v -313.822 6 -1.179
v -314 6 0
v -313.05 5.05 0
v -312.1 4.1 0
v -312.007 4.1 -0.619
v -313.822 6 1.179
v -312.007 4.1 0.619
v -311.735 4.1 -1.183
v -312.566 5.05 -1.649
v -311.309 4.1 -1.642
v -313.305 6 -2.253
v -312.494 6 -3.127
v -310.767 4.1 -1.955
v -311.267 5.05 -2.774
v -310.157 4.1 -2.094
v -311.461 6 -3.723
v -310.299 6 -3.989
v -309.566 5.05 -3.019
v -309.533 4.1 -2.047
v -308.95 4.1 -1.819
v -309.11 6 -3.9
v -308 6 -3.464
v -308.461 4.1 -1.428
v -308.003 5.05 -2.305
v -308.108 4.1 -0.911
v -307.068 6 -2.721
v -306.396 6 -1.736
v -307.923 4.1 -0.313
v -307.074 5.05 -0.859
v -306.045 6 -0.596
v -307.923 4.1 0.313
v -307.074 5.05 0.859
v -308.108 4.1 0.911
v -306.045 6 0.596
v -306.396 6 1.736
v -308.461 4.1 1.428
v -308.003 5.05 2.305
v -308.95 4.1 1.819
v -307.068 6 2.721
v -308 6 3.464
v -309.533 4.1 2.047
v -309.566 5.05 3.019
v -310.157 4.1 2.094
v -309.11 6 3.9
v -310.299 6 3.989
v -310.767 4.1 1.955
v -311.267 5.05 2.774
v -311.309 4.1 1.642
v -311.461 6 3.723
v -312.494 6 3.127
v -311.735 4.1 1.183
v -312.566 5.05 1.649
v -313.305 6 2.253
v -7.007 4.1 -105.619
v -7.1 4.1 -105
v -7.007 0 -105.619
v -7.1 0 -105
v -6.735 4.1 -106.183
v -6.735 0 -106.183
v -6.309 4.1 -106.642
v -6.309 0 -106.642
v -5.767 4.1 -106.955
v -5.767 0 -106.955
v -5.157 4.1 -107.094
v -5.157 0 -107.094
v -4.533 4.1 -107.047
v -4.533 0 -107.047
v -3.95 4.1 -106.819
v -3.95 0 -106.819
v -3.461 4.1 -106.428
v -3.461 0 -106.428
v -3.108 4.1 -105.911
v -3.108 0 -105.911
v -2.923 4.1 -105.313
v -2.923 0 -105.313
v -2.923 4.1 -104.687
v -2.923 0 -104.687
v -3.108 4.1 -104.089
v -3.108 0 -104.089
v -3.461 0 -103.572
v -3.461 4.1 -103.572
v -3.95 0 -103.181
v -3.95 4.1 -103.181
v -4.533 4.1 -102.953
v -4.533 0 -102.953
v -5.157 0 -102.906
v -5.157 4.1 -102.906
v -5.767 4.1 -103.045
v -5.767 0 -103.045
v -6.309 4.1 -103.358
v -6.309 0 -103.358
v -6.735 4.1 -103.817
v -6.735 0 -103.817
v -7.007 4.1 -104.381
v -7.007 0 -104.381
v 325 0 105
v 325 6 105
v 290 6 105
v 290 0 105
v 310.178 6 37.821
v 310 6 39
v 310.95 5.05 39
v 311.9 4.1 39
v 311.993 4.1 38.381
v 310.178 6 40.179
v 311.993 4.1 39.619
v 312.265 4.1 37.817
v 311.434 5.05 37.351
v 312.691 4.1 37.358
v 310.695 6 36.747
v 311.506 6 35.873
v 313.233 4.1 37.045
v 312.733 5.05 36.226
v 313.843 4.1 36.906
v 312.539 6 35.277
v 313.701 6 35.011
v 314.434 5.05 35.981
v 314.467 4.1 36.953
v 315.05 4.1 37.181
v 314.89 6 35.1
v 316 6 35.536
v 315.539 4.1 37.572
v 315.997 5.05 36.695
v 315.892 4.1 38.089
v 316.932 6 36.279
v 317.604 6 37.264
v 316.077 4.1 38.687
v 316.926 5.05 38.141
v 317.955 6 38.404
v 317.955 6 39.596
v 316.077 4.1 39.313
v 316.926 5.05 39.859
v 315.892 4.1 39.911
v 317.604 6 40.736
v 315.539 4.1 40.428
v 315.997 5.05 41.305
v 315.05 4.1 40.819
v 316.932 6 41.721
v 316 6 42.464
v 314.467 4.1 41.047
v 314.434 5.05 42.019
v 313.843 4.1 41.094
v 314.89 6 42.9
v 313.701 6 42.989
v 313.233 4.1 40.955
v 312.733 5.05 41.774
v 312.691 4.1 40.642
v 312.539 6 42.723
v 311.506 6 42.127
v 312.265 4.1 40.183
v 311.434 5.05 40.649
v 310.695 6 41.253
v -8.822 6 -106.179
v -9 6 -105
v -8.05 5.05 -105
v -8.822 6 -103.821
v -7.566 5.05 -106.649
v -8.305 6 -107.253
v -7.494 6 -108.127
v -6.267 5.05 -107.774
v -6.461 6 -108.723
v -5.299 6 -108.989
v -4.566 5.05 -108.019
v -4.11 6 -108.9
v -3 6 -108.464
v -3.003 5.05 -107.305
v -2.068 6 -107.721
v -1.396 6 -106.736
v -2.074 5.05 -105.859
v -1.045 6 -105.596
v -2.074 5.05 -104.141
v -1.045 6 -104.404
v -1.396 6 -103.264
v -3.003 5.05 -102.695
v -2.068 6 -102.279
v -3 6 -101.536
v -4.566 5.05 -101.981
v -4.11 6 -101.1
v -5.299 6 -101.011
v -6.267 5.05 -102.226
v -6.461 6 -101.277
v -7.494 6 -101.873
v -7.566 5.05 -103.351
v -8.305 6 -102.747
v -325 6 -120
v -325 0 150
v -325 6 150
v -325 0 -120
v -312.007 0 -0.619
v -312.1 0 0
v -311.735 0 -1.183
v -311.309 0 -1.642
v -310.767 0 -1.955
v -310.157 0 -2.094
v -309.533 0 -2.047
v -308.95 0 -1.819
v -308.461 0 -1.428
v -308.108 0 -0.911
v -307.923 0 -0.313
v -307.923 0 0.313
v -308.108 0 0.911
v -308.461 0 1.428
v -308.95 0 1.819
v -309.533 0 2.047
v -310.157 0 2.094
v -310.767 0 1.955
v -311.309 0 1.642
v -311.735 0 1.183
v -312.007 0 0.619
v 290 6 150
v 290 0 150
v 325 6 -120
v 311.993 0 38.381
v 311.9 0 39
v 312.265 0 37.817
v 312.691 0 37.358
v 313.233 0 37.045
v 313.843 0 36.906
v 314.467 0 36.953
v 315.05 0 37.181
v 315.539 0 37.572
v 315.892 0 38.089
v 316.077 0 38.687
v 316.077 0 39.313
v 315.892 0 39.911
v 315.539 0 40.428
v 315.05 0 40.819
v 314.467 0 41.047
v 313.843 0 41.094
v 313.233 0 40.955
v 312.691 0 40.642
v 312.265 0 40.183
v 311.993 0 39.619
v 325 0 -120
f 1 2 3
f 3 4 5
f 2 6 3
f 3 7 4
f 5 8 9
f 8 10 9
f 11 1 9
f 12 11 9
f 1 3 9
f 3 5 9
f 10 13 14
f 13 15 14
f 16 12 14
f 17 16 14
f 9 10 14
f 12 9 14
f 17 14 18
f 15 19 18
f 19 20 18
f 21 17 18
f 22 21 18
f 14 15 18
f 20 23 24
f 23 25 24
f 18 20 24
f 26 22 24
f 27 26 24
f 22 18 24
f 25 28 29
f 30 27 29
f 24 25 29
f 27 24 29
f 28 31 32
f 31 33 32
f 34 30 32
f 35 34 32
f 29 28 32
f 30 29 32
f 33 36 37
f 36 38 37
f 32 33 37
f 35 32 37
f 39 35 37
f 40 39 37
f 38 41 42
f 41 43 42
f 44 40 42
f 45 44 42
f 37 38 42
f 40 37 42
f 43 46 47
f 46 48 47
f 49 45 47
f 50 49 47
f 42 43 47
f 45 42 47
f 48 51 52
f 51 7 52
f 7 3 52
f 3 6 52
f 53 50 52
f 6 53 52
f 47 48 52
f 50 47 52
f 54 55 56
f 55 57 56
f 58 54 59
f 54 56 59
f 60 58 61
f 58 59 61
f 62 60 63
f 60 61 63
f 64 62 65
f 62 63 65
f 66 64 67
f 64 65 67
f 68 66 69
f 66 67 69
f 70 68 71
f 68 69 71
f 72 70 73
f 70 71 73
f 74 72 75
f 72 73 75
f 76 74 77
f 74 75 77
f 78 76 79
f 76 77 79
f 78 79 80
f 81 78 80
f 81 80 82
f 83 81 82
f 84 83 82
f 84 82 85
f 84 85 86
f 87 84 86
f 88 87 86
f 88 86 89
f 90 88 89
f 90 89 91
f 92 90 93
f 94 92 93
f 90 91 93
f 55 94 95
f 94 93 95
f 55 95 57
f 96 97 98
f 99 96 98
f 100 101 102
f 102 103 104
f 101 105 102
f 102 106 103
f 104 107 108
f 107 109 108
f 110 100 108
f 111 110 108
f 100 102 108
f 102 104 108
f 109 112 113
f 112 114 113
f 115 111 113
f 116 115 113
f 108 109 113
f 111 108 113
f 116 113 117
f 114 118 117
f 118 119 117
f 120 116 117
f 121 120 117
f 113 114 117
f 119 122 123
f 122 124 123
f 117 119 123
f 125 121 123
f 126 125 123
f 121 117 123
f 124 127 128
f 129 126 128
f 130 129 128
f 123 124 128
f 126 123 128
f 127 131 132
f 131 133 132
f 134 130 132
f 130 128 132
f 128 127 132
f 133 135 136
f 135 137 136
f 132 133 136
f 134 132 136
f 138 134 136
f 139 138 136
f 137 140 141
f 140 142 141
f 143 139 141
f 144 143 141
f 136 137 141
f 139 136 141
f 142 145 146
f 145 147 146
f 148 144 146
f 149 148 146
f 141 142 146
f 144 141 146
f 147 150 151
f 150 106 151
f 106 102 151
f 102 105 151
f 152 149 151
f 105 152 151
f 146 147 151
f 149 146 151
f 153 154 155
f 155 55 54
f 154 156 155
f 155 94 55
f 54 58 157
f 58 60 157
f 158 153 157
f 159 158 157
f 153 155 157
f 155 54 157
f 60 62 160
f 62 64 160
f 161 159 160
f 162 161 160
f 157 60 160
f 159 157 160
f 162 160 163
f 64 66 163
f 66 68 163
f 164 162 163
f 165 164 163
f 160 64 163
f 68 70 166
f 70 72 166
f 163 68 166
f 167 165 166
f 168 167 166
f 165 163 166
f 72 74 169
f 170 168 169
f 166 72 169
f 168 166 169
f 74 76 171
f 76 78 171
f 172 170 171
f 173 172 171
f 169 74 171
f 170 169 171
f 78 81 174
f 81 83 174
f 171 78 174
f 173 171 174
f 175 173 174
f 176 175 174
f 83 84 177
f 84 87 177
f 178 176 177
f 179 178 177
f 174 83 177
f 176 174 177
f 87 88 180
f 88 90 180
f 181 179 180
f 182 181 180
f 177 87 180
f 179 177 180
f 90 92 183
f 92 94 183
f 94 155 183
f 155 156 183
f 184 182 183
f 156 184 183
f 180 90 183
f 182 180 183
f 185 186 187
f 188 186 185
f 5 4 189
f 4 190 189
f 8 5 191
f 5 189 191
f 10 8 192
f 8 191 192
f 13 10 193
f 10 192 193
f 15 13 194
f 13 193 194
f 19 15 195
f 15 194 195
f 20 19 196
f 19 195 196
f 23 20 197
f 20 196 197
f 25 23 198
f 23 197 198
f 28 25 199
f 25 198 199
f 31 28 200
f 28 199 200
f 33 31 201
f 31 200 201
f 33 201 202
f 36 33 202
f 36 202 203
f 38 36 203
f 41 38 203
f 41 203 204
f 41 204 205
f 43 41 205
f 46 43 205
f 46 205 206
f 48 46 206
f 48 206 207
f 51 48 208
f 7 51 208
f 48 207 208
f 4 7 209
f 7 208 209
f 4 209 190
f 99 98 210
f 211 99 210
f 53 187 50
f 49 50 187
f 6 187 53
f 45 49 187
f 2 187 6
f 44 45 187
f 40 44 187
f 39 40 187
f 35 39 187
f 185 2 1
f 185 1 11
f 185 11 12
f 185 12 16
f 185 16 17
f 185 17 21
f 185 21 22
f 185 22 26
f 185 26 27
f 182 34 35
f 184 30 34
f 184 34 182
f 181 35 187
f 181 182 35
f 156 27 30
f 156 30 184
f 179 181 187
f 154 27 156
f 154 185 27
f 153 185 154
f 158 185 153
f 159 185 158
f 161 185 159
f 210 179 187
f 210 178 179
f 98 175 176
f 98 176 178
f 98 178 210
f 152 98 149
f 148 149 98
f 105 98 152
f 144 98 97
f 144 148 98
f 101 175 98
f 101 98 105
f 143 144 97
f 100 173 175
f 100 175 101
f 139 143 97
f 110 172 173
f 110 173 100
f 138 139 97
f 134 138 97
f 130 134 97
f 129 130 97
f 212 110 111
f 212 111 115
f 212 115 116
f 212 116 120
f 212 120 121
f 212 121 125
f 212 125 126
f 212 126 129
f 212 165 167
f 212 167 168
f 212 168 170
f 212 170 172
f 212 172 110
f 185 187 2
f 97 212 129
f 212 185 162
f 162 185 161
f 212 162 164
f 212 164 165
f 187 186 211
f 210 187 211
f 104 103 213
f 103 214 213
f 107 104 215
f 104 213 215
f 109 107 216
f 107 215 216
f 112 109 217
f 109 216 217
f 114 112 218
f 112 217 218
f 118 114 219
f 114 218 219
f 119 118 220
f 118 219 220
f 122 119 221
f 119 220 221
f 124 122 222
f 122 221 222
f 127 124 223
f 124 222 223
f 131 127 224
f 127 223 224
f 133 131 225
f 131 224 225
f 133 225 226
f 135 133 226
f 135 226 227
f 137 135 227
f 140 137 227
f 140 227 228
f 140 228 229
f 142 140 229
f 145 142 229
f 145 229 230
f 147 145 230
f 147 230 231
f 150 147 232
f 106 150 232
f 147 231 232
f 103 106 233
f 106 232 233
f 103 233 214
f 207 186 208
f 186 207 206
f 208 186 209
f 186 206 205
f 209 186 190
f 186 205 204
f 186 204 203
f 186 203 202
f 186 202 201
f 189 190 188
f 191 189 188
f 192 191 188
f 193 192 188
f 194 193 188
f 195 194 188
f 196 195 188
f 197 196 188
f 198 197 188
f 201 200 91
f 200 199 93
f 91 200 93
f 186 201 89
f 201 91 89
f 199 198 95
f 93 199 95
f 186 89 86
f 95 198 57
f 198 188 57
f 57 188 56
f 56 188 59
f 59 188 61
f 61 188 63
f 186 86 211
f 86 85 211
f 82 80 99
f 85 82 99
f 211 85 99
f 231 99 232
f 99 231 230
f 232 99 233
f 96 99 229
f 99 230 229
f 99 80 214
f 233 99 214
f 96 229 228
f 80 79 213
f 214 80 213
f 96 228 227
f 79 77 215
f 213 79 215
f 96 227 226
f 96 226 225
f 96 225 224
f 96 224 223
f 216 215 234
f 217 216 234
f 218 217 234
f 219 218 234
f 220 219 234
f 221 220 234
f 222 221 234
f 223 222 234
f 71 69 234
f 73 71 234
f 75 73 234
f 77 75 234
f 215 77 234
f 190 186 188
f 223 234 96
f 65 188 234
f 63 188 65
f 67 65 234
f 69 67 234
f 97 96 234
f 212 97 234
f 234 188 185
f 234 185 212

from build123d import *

# Parameters (mm, degrees)
SKETCH1_W                                       = 650
SKETCH1_H                                       = 270
BOSS_EXTRUDE1_DEPTH                             = 6
SKETCH2_W                                       = 35
SKETCH2_H                                       = 45
CUT_EXTRUDE1_DEPTH                              = 358.995810031
CSK_FOR_M4_FLAT_HEAD_MACHINE_SCREW1_D           = 4.2
CSK_FOR_M4_FLAT_HEAD_MACHINE_SCREW1_CSINK_D     = 8
CSK_FOR_M4_FLAT_HEAD_MACHINE_SCREW1_CSINK_ANGLE = 90


with BuildPart() as part:
    # Sketch1 → Boss-Extrude1 (new body)
    with BuildSketch(Plane(origin=(0, 0, 0), x_dir=(1, 0, 0), z_dir=(0, 1, 0))):
        with Locations((0, -15)):
            Rectangle(SKETCH1_W, SKETCH1_H)
    extrude(amount=BOSS_EXTRUDE1_DEPTH)

    # Sketch2 → Cut-Extrude1 (cut, through all)
    with BuildSketch(Plane(origin=(0, 6, 0), x_dir=(1, 0, 0), z_dir=(0, 1, 0))):
        with Locations((307.5, -127.5)):
            Rectangle(SKETCH2_W, SKETCH2_H)
        Polygon((337.933434696, -105), (325, -105), (325, -150), (290, -150), (290, -185.199938578), (337.933434696, -185.199938578), align=None)
    extrude(amount=-CUT_EXTRUDE1_DEPTH, mode=Mode.SUBTRACT)

    # CSK for M4 Flat Head Machine Screw1 (through all)
    with Locations(Plane(origin=(0, 6, 0), x_dir=(1, 0, 0), z_dir=(0, 1, 0))):
        with Locations((-310, 0), (-5, 105), (314, -39)):
            CounterSinkHole(CSK_FOR_M4_FLAT_HEAD_MACHINE_SCREW1_D / 2, CSK_FOR_M4_FLAT_HEAD_MACHINE_SCREW1_CSINK_D / 2, counter_sink_angle=CSK_FOR_M4_FLAT_HEAD_MACHINE_SCREW1_CSINK_ANGLE)


solid = part.part
